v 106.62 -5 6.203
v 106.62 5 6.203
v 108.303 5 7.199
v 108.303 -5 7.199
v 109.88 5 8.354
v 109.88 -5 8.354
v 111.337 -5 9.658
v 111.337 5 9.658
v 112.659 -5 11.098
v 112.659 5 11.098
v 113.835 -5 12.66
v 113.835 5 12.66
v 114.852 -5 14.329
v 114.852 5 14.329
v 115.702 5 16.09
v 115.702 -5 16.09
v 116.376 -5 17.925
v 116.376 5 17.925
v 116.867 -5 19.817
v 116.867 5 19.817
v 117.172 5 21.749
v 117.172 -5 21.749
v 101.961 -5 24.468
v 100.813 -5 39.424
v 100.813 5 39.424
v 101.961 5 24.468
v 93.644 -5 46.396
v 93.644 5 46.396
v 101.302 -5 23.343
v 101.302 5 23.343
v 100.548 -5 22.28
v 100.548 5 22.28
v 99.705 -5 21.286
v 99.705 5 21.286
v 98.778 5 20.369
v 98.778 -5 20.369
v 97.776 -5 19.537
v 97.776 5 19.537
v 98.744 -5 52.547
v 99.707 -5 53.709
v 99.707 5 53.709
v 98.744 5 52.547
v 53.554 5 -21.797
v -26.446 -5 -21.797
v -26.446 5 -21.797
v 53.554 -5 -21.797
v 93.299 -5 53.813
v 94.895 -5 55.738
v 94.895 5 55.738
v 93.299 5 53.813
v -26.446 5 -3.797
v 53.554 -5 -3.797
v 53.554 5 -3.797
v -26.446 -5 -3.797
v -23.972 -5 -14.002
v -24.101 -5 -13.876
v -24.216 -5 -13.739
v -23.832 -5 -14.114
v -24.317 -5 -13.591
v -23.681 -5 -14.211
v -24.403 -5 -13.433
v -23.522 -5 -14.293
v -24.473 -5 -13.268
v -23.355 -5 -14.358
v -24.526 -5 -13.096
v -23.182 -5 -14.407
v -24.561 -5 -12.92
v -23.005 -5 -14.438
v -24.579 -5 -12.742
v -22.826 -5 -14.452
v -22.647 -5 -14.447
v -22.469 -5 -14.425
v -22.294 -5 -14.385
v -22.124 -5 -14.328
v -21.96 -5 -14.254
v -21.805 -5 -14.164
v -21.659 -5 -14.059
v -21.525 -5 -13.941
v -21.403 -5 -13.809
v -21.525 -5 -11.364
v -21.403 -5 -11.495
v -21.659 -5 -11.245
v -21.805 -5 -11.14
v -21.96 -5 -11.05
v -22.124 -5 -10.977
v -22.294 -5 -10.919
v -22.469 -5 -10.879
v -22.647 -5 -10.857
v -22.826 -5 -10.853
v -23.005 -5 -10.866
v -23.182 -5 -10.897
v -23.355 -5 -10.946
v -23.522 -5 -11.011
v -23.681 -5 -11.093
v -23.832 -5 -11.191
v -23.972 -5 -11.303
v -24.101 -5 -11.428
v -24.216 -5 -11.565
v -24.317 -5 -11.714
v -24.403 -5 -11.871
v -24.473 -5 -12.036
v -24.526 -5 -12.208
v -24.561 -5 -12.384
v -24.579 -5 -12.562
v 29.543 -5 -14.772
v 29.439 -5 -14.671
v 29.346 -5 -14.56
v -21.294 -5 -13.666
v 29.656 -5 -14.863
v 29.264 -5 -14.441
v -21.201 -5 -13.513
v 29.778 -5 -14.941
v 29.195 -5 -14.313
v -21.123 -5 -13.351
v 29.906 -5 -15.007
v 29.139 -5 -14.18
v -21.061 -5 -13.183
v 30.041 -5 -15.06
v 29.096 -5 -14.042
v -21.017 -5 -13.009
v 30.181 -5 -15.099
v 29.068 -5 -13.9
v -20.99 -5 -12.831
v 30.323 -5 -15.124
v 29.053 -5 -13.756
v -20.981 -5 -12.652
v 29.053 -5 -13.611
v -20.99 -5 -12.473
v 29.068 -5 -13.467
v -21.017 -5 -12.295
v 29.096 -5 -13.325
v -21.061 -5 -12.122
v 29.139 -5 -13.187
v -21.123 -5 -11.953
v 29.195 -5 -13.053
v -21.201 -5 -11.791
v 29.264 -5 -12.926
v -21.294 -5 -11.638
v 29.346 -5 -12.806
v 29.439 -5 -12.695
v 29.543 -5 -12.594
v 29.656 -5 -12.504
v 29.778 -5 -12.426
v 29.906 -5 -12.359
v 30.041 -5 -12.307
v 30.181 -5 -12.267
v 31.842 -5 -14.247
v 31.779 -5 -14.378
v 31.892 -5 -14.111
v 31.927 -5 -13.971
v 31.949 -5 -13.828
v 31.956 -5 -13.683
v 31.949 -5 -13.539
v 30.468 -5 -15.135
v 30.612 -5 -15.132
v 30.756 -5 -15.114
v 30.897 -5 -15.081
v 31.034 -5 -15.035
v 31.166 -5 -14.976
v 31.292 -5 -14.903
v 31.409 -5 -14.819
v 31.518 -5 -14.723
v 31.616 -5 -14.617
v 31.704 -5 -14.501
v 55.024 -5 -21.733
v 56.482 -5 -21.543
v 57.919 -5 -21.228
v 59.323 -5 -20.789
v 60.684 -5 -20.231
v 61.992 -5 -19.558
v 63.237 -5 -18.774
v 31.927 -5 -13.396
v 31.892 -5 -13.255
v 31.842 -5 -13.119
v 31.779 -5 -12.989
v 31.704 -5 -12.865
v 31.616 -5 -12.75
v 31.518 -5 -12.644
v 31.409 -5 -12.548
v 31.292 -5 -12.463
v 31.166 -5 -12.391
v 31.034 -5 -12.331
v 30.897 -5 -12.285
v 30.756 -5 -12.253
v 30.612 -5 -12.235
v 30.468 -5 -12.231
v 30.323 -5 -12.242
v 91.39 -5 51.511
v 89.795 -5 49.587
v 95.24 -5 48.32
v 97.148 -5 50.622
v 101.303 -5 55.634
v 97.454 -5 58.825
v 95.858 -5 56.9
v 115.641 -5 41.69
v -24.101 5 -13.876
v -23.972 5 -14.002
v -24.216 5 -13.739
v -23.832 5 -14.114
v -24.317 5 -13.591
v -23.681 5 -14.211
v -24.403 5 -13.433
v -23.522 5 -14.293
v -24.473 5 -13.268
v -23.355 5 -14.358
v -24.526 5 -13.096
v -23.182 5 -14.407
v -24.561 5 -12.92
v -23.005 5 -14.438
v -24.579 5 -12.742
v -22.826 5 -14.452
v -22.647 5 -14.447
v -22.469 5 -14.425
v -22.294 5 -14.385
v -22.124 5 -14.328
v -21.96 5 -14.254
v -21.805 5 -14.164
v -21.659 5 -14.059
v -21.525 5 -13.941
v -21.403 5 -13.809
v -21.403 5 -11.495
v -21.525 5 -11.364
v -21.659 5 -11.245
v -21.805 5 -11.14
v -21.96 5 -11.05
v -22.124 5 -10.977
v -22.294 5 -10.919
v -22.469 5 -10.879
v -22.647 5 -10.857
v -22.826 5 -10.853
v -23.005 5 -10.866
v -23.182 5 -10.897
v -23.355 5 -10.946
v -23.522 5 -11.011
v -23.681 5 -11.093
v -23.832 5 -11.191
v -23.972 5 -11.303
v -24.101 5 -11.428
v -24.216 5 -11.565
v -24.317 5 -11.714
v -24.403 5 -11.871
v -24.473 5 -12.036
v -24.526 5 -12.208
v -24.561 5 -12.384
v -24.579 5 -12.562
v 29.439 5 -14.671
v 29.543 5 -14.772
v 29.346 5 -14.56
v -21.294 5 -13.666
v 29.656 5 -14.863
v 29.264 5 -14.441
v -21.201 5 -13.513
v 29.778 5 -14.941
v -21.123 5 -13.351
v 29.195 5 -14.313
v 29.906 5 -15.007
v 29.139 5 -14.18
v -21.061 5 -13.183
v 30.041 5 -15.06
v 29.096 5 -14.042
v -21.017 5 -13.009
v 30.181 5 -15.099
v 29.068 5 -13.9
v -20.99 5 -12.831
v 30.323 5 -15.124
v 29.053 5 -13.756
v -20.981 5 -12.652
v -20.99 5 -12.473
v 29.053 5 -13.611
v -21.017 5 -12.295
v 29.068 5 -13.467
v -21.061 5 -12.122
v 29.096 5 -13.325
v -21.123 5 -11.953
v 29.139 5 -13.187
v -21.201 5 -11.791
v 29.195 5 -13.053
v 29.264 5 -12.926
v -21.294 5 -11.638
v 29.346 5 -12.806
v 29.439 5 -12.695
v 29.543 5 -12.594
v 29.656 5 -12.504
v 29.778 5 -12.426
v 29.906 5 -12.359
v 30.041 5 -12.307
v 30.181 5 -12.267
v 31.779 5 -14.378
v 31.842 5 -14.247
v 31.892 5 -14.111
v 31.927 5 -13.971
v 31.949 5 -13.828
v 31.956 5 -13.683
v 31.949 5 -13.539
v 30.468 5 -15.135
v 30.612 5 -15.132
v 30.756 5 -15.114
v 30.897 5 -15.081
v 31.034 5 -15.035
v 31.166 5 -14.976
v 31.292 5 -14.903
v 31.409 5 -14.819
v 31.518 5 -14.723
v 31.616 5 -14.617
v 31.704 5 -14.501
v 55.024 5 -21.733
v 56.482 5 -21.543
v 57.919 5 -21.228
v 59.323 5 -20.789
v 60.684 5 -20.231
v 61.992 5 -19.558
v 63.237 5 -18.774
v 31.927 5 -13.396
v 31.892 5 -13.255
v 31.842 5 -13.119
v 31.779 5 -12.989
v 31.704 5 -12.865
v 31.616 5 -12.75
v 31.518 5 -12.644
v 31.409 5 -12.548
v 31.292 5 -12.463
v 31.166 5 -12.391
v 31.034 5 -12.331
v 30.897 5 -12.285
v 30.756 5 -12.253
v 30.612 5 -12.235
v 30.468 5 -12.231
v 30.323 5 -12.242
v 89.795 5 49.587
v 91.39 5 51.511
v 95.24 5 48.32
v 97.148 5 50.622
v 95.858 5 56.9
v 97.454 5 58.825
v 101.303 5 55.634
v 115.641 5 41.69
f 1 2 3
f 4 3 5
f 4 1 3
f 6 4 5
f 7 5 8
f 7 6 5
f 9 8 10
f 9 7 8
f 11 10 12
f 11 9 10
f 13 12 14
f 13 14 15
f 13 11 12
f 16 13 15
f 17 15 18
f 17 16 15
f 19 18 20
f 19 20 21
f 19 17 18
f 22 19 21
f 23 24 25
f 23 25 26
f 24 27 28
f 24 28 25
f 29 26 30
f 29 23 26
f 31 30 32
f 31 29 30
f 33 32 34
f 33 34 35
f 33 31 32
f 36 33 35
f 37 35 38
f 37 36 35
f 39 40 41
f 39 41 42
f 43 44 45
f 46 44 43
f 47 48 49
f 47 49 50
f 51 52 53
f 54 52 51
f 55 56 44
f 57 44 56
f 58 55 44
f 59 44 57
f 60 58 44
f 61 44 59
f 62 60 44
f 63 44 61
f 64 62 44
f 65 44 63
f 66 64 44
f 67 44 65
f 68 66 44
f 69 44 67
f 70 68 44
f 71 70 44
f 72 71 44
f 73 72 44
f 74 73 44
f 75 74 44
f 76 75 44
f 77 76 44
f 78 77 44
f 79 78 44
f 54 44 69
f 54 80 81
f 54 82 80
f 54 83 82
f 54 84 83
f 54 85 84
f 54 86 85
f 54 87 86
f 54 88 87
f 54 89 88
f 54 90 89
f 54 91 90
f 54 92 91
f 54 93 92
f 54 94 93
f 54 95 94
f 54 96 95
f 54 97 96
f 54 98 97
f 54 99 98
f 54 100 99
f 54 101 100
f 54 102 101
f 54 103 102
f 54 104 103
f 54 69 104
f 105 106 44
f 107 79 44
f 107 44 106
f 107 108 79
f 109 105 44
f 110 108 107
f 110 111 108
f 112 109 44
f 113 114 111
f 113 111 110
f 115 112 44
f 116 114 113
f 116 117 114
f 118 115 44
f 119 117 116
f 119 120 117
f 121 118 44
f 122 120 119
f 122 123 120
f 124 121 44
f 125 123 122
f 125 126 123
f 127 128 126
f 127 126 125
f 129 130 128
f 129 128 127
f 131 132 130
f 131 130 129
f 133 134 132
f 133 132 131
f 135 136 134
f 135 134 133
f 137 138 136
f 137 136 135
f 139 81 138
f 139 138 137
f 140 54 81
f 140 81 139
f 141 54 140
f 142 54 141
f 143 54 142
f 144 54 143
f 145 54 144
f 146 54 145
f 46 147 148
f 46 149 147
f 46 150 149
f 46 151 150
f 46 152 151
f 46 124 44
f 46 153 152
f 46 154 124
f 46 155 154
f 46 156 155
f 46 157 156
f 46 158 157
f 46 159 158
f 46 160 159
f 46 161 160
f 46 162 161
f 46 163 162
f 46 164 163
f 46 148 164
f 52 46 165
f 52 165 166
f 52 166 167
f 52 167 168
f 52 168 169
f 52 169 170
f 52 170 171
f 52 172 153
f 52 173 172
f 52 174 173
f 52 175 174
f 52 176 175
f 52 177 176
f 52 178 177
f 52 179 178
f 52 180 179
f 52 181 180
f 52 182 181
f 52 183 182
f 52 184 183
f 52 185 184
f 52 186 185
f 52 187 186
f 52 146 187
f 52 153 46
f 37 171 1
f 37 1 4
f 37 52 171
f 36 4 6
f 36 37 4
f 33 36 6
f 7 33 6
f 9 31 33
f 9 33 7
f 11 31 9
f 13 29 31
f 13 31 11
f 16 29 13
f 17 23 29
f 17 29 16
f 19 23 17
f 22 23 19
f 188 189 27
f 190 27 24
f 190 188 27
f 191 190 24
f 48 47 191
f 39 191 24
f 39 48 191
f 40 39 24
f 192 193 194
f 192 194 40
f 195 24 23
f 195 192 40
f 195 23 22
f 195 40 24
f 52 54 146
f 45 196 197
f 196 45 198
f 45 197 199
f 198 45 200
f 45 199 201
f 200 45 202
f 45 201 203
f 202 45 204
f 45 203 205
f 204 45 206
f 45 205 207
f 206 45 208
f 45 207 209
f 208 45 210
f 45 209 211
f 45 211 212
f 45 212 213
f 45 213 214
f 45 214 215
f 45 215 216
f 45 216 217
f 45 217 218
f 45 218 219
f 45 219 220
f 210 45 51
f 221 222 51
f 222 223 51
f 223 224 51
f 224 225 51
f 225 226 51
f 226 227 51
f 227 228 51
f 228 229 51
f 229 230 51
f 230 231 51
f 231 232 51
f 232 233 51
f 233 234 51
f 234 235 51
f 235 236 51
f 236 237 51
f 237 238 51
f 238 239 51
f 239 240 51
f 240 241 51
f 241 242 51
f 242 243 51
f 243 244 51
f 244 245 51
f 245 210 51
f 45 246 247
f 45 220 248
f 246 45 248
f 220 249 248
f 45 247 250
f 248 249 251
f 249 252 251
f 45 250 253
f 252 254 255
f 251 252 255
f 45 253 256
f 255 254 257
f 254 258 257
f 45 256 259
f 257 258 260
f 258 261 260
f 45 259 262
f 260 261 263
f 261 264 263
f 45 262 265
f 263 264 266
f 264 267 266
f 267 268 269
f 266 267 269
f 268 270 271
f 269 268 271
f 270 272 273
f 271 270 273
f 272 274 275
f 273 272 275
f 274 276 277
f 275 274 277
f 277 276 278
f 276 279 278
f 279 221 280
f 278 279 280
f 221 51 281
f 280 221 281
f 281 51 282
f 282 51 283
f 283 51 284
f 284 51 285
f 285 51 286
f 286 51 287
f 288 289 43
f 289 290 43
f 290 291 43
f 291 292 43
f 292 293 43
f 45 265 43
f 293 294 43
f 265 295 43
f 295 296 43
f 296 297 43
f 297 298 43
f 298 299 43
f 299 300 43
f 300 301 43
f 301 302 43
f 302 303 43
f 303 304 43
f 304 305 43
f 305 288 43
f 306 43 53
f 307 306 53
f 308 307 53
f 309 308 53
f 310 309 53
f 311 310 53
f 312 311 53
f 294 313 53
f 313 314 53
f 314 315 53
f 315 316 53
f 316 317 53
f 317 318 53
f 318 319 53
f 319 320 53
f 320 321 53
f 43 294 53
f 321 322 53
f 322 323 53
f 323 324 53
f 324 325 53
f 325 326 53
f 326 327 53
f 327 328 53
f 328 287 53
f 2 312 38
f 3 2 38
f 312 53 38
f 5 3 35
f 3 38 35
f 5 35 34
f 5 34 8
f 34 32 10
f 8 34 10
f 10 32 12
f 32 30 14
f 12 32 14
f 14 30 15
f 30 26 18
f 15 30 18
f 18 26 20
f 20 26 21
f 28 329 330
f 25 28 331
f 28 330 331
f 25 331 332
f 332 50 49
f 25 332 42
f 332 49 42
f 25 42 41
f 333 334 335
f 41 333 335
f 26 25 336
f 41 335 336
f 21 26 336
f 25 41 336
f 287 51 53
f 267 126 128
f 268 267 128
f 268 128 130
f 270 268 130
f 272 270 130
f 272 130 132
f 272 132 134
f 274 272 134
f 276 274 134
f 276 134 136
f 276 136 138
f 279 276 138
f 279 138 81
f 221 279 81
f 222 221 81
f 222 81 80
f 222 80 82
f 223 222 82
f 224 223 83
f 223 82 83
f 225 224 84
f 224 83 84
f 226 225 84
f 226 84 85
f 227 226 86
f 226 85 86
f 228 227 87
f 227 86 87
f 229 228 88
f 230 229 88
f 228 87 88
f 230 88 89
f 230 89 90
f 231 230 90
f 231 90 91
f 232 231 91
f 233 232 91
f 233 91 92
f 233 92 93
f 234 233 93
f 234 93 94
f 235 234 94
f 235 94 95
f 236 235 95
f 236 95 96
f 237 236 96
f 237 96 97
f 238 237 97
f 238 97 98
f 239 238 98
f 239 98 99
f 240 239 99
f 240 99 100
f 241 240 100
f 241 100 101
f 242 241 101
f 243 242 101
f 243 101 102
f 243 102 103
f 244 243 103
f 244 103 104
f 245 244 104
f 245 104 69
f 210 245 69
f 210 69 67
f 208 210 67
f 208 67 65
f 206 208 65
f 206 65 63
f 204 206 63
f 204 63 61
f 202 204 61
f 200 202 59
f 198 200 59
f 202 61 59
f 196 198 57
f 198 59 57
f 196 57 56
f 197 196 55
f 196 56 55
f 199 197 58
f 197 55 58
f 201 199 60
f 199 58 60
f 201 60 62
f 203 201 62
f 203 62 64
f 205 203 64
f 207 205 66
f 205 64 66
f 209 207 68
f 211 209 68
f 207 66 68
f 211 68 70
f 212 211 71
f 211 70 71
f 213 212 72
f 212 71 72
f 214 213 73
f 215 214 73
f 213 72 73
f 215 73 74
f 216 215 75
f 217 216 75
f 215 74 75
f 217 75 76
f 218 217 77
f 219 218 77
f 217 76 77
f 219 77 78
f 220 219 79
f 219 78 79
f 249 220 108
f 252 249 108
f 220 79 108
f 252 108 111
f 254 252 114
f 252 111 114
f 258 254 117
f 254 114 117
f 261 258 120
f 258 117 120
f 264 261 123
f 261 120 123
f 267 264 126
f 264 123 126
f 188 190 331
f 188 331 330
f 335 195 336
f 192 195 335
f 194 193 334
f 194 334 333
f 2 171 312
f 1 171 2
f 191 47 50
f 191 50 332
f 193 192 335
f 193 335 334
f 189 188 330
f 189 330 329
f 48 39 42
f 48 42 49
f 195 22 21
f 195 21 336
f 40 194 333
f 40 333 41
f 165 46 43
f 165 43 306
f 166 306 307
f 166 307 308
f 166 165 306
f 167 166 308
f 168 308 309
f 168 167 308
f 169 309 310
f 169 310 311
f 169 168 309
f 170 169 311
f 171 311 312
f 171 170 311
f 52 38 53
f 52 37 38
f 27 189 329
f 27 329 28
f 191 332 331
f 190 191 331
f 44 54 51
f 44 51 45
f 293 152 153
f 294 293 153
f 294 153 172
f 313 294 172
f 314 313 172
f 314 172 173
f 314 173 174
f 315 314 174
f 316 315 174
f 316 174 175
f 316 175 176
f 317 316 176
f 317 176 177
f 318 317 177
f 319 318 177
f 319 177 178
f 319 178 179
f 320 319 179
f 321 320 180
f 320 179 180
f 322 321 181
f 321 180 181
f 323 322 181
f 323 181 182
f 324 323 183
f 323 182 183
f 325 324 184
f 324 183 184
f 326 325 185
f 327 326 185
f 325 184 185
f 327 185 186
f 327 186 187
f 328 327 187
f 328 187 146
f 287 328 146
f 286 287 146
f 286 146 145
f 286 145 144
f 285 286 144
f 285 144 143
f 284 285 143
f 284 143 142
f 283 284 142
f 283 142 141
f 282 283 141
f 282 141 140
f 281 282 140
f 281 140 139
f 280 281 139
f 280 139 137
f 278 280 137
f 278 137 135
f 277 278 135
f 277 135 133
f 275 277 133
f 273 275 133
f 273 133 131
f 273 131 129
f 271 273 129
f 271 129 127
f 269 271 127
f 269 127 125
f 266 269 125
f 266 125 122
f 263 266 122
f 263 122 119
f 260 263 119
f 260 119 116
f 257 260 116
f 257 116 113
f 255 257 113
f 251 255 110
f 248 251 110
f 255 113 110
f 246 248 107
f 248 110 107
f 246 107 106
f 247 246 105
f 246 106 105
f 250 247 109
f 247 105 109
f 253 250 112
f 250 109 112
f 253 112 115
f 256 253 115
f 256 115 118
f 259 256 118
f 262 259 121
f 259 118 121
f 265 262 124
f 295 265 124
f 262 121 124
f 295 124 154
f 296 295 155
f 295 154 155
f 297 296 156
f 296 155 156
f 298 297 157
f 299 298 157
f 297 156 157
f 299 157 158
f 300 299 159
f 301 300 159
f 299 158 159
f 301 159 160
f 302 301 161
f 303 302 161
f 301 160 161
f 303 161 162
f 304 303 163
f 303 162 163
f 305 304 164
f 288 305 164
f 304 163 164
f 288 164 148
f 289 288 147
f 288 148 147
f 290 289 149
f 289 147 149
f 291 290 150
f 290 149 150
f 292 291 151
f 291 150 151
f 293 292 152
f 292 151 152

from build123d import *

# Parameters (mm, degrees)
F1_DEPTH = 5
F2_R     = 1.45235
F3_DEPTH = 26
F5_R     = 1.8
F6_DEPTH = 25


with BuildPart() as f1:
    # F0 (on Front) → F1 (new body, symmetric)
    with BuildSketch(Plane.XZ):
        Polygon((53.554079, -3.796815), (-20.445921, -3.796815), (-26.445921, -3.796815), (-26.445921, -21.796815), (-20.445921, -21.796815), (53.554079, -21.796815), align=None)
        with BuildLine():
            Line((97.775743, 19.536518), (53.554079, -3.796815))
            Line((53.554079, -3.796815), (53.554079, -21.796815))
            ThreePointArc((53.554079, -21.796815), (58.625986, -21.023499), (63.236974, -18.773824))
            Line((63.236974, -18.773824), (106.620076, 6.203185))
            Line((106.620076, 6.203185), (97.775743, 19.536518))
        make_face()
        with BuildLine():
            ThreePointArc((101.961013, 24.4677), (100.137325, 21.773844), (97.775743, 19.536518))
            Line((97.775743, 19.536518), (106.620076, 6.203185))
            ThreePointArc((106.620076, 6.203185), (113.834838, 12.659729), (117.171564, 21.748515))
            Line((117.171564, 21.748515), (115.640686, 41.689839))
            Line((115.640686, 41.689839), (100.812855, 39.423693))
            Line((100.812855, 39.423693), (101.961013, 24.4677))
        make_face()
        Polygon((93.643953, 46.395555), (100.812855, 39.423693), (115.640686, 41.689839), (101.302883, 55.633563), (99.707273, 53.708978), (98.743672, 52.546706), (97.148061, 50.622121), (95.239564, 48.32014), align=None)
        Polygon((89.794783, 49.586776), (93.643953, 46.395555), (95.239564, 48.32014), (91.390394, 51.511361), align=None)
        Polygon((99.707273, 53.708978), (101.302883, 55.633563), (97.453713, 58.824784), (95.858103, 56.900199), align=None)
        Polygon((93.298891, 53.813342), (97.148061, 50.622121), (98.743672, 52.546706), (94.894502, 55.737927), align=None)
    extrude(amount=F1_DEPTH, both=True)

    # F2 (on face) → F3 (cut)
    with BuildSketch(Plane.XZ.offset(5)):
        with Locations((30.503755, -13.683314)):
            Circle(F2_R)
    extrude(amount=-F3_DEPTH, mode=Mode.SUBTRACT)

    # F5 (on face) → F6 (cut)
    with BuildSketch(Plane.XZ.offset(5)):
        with Locations((-22.781451, -12.652125)):
            Circle(F5_R)
    extrude(amount=-F6_DEPTH, mode=Mode.SUBTRACT)


solid = f1.part
